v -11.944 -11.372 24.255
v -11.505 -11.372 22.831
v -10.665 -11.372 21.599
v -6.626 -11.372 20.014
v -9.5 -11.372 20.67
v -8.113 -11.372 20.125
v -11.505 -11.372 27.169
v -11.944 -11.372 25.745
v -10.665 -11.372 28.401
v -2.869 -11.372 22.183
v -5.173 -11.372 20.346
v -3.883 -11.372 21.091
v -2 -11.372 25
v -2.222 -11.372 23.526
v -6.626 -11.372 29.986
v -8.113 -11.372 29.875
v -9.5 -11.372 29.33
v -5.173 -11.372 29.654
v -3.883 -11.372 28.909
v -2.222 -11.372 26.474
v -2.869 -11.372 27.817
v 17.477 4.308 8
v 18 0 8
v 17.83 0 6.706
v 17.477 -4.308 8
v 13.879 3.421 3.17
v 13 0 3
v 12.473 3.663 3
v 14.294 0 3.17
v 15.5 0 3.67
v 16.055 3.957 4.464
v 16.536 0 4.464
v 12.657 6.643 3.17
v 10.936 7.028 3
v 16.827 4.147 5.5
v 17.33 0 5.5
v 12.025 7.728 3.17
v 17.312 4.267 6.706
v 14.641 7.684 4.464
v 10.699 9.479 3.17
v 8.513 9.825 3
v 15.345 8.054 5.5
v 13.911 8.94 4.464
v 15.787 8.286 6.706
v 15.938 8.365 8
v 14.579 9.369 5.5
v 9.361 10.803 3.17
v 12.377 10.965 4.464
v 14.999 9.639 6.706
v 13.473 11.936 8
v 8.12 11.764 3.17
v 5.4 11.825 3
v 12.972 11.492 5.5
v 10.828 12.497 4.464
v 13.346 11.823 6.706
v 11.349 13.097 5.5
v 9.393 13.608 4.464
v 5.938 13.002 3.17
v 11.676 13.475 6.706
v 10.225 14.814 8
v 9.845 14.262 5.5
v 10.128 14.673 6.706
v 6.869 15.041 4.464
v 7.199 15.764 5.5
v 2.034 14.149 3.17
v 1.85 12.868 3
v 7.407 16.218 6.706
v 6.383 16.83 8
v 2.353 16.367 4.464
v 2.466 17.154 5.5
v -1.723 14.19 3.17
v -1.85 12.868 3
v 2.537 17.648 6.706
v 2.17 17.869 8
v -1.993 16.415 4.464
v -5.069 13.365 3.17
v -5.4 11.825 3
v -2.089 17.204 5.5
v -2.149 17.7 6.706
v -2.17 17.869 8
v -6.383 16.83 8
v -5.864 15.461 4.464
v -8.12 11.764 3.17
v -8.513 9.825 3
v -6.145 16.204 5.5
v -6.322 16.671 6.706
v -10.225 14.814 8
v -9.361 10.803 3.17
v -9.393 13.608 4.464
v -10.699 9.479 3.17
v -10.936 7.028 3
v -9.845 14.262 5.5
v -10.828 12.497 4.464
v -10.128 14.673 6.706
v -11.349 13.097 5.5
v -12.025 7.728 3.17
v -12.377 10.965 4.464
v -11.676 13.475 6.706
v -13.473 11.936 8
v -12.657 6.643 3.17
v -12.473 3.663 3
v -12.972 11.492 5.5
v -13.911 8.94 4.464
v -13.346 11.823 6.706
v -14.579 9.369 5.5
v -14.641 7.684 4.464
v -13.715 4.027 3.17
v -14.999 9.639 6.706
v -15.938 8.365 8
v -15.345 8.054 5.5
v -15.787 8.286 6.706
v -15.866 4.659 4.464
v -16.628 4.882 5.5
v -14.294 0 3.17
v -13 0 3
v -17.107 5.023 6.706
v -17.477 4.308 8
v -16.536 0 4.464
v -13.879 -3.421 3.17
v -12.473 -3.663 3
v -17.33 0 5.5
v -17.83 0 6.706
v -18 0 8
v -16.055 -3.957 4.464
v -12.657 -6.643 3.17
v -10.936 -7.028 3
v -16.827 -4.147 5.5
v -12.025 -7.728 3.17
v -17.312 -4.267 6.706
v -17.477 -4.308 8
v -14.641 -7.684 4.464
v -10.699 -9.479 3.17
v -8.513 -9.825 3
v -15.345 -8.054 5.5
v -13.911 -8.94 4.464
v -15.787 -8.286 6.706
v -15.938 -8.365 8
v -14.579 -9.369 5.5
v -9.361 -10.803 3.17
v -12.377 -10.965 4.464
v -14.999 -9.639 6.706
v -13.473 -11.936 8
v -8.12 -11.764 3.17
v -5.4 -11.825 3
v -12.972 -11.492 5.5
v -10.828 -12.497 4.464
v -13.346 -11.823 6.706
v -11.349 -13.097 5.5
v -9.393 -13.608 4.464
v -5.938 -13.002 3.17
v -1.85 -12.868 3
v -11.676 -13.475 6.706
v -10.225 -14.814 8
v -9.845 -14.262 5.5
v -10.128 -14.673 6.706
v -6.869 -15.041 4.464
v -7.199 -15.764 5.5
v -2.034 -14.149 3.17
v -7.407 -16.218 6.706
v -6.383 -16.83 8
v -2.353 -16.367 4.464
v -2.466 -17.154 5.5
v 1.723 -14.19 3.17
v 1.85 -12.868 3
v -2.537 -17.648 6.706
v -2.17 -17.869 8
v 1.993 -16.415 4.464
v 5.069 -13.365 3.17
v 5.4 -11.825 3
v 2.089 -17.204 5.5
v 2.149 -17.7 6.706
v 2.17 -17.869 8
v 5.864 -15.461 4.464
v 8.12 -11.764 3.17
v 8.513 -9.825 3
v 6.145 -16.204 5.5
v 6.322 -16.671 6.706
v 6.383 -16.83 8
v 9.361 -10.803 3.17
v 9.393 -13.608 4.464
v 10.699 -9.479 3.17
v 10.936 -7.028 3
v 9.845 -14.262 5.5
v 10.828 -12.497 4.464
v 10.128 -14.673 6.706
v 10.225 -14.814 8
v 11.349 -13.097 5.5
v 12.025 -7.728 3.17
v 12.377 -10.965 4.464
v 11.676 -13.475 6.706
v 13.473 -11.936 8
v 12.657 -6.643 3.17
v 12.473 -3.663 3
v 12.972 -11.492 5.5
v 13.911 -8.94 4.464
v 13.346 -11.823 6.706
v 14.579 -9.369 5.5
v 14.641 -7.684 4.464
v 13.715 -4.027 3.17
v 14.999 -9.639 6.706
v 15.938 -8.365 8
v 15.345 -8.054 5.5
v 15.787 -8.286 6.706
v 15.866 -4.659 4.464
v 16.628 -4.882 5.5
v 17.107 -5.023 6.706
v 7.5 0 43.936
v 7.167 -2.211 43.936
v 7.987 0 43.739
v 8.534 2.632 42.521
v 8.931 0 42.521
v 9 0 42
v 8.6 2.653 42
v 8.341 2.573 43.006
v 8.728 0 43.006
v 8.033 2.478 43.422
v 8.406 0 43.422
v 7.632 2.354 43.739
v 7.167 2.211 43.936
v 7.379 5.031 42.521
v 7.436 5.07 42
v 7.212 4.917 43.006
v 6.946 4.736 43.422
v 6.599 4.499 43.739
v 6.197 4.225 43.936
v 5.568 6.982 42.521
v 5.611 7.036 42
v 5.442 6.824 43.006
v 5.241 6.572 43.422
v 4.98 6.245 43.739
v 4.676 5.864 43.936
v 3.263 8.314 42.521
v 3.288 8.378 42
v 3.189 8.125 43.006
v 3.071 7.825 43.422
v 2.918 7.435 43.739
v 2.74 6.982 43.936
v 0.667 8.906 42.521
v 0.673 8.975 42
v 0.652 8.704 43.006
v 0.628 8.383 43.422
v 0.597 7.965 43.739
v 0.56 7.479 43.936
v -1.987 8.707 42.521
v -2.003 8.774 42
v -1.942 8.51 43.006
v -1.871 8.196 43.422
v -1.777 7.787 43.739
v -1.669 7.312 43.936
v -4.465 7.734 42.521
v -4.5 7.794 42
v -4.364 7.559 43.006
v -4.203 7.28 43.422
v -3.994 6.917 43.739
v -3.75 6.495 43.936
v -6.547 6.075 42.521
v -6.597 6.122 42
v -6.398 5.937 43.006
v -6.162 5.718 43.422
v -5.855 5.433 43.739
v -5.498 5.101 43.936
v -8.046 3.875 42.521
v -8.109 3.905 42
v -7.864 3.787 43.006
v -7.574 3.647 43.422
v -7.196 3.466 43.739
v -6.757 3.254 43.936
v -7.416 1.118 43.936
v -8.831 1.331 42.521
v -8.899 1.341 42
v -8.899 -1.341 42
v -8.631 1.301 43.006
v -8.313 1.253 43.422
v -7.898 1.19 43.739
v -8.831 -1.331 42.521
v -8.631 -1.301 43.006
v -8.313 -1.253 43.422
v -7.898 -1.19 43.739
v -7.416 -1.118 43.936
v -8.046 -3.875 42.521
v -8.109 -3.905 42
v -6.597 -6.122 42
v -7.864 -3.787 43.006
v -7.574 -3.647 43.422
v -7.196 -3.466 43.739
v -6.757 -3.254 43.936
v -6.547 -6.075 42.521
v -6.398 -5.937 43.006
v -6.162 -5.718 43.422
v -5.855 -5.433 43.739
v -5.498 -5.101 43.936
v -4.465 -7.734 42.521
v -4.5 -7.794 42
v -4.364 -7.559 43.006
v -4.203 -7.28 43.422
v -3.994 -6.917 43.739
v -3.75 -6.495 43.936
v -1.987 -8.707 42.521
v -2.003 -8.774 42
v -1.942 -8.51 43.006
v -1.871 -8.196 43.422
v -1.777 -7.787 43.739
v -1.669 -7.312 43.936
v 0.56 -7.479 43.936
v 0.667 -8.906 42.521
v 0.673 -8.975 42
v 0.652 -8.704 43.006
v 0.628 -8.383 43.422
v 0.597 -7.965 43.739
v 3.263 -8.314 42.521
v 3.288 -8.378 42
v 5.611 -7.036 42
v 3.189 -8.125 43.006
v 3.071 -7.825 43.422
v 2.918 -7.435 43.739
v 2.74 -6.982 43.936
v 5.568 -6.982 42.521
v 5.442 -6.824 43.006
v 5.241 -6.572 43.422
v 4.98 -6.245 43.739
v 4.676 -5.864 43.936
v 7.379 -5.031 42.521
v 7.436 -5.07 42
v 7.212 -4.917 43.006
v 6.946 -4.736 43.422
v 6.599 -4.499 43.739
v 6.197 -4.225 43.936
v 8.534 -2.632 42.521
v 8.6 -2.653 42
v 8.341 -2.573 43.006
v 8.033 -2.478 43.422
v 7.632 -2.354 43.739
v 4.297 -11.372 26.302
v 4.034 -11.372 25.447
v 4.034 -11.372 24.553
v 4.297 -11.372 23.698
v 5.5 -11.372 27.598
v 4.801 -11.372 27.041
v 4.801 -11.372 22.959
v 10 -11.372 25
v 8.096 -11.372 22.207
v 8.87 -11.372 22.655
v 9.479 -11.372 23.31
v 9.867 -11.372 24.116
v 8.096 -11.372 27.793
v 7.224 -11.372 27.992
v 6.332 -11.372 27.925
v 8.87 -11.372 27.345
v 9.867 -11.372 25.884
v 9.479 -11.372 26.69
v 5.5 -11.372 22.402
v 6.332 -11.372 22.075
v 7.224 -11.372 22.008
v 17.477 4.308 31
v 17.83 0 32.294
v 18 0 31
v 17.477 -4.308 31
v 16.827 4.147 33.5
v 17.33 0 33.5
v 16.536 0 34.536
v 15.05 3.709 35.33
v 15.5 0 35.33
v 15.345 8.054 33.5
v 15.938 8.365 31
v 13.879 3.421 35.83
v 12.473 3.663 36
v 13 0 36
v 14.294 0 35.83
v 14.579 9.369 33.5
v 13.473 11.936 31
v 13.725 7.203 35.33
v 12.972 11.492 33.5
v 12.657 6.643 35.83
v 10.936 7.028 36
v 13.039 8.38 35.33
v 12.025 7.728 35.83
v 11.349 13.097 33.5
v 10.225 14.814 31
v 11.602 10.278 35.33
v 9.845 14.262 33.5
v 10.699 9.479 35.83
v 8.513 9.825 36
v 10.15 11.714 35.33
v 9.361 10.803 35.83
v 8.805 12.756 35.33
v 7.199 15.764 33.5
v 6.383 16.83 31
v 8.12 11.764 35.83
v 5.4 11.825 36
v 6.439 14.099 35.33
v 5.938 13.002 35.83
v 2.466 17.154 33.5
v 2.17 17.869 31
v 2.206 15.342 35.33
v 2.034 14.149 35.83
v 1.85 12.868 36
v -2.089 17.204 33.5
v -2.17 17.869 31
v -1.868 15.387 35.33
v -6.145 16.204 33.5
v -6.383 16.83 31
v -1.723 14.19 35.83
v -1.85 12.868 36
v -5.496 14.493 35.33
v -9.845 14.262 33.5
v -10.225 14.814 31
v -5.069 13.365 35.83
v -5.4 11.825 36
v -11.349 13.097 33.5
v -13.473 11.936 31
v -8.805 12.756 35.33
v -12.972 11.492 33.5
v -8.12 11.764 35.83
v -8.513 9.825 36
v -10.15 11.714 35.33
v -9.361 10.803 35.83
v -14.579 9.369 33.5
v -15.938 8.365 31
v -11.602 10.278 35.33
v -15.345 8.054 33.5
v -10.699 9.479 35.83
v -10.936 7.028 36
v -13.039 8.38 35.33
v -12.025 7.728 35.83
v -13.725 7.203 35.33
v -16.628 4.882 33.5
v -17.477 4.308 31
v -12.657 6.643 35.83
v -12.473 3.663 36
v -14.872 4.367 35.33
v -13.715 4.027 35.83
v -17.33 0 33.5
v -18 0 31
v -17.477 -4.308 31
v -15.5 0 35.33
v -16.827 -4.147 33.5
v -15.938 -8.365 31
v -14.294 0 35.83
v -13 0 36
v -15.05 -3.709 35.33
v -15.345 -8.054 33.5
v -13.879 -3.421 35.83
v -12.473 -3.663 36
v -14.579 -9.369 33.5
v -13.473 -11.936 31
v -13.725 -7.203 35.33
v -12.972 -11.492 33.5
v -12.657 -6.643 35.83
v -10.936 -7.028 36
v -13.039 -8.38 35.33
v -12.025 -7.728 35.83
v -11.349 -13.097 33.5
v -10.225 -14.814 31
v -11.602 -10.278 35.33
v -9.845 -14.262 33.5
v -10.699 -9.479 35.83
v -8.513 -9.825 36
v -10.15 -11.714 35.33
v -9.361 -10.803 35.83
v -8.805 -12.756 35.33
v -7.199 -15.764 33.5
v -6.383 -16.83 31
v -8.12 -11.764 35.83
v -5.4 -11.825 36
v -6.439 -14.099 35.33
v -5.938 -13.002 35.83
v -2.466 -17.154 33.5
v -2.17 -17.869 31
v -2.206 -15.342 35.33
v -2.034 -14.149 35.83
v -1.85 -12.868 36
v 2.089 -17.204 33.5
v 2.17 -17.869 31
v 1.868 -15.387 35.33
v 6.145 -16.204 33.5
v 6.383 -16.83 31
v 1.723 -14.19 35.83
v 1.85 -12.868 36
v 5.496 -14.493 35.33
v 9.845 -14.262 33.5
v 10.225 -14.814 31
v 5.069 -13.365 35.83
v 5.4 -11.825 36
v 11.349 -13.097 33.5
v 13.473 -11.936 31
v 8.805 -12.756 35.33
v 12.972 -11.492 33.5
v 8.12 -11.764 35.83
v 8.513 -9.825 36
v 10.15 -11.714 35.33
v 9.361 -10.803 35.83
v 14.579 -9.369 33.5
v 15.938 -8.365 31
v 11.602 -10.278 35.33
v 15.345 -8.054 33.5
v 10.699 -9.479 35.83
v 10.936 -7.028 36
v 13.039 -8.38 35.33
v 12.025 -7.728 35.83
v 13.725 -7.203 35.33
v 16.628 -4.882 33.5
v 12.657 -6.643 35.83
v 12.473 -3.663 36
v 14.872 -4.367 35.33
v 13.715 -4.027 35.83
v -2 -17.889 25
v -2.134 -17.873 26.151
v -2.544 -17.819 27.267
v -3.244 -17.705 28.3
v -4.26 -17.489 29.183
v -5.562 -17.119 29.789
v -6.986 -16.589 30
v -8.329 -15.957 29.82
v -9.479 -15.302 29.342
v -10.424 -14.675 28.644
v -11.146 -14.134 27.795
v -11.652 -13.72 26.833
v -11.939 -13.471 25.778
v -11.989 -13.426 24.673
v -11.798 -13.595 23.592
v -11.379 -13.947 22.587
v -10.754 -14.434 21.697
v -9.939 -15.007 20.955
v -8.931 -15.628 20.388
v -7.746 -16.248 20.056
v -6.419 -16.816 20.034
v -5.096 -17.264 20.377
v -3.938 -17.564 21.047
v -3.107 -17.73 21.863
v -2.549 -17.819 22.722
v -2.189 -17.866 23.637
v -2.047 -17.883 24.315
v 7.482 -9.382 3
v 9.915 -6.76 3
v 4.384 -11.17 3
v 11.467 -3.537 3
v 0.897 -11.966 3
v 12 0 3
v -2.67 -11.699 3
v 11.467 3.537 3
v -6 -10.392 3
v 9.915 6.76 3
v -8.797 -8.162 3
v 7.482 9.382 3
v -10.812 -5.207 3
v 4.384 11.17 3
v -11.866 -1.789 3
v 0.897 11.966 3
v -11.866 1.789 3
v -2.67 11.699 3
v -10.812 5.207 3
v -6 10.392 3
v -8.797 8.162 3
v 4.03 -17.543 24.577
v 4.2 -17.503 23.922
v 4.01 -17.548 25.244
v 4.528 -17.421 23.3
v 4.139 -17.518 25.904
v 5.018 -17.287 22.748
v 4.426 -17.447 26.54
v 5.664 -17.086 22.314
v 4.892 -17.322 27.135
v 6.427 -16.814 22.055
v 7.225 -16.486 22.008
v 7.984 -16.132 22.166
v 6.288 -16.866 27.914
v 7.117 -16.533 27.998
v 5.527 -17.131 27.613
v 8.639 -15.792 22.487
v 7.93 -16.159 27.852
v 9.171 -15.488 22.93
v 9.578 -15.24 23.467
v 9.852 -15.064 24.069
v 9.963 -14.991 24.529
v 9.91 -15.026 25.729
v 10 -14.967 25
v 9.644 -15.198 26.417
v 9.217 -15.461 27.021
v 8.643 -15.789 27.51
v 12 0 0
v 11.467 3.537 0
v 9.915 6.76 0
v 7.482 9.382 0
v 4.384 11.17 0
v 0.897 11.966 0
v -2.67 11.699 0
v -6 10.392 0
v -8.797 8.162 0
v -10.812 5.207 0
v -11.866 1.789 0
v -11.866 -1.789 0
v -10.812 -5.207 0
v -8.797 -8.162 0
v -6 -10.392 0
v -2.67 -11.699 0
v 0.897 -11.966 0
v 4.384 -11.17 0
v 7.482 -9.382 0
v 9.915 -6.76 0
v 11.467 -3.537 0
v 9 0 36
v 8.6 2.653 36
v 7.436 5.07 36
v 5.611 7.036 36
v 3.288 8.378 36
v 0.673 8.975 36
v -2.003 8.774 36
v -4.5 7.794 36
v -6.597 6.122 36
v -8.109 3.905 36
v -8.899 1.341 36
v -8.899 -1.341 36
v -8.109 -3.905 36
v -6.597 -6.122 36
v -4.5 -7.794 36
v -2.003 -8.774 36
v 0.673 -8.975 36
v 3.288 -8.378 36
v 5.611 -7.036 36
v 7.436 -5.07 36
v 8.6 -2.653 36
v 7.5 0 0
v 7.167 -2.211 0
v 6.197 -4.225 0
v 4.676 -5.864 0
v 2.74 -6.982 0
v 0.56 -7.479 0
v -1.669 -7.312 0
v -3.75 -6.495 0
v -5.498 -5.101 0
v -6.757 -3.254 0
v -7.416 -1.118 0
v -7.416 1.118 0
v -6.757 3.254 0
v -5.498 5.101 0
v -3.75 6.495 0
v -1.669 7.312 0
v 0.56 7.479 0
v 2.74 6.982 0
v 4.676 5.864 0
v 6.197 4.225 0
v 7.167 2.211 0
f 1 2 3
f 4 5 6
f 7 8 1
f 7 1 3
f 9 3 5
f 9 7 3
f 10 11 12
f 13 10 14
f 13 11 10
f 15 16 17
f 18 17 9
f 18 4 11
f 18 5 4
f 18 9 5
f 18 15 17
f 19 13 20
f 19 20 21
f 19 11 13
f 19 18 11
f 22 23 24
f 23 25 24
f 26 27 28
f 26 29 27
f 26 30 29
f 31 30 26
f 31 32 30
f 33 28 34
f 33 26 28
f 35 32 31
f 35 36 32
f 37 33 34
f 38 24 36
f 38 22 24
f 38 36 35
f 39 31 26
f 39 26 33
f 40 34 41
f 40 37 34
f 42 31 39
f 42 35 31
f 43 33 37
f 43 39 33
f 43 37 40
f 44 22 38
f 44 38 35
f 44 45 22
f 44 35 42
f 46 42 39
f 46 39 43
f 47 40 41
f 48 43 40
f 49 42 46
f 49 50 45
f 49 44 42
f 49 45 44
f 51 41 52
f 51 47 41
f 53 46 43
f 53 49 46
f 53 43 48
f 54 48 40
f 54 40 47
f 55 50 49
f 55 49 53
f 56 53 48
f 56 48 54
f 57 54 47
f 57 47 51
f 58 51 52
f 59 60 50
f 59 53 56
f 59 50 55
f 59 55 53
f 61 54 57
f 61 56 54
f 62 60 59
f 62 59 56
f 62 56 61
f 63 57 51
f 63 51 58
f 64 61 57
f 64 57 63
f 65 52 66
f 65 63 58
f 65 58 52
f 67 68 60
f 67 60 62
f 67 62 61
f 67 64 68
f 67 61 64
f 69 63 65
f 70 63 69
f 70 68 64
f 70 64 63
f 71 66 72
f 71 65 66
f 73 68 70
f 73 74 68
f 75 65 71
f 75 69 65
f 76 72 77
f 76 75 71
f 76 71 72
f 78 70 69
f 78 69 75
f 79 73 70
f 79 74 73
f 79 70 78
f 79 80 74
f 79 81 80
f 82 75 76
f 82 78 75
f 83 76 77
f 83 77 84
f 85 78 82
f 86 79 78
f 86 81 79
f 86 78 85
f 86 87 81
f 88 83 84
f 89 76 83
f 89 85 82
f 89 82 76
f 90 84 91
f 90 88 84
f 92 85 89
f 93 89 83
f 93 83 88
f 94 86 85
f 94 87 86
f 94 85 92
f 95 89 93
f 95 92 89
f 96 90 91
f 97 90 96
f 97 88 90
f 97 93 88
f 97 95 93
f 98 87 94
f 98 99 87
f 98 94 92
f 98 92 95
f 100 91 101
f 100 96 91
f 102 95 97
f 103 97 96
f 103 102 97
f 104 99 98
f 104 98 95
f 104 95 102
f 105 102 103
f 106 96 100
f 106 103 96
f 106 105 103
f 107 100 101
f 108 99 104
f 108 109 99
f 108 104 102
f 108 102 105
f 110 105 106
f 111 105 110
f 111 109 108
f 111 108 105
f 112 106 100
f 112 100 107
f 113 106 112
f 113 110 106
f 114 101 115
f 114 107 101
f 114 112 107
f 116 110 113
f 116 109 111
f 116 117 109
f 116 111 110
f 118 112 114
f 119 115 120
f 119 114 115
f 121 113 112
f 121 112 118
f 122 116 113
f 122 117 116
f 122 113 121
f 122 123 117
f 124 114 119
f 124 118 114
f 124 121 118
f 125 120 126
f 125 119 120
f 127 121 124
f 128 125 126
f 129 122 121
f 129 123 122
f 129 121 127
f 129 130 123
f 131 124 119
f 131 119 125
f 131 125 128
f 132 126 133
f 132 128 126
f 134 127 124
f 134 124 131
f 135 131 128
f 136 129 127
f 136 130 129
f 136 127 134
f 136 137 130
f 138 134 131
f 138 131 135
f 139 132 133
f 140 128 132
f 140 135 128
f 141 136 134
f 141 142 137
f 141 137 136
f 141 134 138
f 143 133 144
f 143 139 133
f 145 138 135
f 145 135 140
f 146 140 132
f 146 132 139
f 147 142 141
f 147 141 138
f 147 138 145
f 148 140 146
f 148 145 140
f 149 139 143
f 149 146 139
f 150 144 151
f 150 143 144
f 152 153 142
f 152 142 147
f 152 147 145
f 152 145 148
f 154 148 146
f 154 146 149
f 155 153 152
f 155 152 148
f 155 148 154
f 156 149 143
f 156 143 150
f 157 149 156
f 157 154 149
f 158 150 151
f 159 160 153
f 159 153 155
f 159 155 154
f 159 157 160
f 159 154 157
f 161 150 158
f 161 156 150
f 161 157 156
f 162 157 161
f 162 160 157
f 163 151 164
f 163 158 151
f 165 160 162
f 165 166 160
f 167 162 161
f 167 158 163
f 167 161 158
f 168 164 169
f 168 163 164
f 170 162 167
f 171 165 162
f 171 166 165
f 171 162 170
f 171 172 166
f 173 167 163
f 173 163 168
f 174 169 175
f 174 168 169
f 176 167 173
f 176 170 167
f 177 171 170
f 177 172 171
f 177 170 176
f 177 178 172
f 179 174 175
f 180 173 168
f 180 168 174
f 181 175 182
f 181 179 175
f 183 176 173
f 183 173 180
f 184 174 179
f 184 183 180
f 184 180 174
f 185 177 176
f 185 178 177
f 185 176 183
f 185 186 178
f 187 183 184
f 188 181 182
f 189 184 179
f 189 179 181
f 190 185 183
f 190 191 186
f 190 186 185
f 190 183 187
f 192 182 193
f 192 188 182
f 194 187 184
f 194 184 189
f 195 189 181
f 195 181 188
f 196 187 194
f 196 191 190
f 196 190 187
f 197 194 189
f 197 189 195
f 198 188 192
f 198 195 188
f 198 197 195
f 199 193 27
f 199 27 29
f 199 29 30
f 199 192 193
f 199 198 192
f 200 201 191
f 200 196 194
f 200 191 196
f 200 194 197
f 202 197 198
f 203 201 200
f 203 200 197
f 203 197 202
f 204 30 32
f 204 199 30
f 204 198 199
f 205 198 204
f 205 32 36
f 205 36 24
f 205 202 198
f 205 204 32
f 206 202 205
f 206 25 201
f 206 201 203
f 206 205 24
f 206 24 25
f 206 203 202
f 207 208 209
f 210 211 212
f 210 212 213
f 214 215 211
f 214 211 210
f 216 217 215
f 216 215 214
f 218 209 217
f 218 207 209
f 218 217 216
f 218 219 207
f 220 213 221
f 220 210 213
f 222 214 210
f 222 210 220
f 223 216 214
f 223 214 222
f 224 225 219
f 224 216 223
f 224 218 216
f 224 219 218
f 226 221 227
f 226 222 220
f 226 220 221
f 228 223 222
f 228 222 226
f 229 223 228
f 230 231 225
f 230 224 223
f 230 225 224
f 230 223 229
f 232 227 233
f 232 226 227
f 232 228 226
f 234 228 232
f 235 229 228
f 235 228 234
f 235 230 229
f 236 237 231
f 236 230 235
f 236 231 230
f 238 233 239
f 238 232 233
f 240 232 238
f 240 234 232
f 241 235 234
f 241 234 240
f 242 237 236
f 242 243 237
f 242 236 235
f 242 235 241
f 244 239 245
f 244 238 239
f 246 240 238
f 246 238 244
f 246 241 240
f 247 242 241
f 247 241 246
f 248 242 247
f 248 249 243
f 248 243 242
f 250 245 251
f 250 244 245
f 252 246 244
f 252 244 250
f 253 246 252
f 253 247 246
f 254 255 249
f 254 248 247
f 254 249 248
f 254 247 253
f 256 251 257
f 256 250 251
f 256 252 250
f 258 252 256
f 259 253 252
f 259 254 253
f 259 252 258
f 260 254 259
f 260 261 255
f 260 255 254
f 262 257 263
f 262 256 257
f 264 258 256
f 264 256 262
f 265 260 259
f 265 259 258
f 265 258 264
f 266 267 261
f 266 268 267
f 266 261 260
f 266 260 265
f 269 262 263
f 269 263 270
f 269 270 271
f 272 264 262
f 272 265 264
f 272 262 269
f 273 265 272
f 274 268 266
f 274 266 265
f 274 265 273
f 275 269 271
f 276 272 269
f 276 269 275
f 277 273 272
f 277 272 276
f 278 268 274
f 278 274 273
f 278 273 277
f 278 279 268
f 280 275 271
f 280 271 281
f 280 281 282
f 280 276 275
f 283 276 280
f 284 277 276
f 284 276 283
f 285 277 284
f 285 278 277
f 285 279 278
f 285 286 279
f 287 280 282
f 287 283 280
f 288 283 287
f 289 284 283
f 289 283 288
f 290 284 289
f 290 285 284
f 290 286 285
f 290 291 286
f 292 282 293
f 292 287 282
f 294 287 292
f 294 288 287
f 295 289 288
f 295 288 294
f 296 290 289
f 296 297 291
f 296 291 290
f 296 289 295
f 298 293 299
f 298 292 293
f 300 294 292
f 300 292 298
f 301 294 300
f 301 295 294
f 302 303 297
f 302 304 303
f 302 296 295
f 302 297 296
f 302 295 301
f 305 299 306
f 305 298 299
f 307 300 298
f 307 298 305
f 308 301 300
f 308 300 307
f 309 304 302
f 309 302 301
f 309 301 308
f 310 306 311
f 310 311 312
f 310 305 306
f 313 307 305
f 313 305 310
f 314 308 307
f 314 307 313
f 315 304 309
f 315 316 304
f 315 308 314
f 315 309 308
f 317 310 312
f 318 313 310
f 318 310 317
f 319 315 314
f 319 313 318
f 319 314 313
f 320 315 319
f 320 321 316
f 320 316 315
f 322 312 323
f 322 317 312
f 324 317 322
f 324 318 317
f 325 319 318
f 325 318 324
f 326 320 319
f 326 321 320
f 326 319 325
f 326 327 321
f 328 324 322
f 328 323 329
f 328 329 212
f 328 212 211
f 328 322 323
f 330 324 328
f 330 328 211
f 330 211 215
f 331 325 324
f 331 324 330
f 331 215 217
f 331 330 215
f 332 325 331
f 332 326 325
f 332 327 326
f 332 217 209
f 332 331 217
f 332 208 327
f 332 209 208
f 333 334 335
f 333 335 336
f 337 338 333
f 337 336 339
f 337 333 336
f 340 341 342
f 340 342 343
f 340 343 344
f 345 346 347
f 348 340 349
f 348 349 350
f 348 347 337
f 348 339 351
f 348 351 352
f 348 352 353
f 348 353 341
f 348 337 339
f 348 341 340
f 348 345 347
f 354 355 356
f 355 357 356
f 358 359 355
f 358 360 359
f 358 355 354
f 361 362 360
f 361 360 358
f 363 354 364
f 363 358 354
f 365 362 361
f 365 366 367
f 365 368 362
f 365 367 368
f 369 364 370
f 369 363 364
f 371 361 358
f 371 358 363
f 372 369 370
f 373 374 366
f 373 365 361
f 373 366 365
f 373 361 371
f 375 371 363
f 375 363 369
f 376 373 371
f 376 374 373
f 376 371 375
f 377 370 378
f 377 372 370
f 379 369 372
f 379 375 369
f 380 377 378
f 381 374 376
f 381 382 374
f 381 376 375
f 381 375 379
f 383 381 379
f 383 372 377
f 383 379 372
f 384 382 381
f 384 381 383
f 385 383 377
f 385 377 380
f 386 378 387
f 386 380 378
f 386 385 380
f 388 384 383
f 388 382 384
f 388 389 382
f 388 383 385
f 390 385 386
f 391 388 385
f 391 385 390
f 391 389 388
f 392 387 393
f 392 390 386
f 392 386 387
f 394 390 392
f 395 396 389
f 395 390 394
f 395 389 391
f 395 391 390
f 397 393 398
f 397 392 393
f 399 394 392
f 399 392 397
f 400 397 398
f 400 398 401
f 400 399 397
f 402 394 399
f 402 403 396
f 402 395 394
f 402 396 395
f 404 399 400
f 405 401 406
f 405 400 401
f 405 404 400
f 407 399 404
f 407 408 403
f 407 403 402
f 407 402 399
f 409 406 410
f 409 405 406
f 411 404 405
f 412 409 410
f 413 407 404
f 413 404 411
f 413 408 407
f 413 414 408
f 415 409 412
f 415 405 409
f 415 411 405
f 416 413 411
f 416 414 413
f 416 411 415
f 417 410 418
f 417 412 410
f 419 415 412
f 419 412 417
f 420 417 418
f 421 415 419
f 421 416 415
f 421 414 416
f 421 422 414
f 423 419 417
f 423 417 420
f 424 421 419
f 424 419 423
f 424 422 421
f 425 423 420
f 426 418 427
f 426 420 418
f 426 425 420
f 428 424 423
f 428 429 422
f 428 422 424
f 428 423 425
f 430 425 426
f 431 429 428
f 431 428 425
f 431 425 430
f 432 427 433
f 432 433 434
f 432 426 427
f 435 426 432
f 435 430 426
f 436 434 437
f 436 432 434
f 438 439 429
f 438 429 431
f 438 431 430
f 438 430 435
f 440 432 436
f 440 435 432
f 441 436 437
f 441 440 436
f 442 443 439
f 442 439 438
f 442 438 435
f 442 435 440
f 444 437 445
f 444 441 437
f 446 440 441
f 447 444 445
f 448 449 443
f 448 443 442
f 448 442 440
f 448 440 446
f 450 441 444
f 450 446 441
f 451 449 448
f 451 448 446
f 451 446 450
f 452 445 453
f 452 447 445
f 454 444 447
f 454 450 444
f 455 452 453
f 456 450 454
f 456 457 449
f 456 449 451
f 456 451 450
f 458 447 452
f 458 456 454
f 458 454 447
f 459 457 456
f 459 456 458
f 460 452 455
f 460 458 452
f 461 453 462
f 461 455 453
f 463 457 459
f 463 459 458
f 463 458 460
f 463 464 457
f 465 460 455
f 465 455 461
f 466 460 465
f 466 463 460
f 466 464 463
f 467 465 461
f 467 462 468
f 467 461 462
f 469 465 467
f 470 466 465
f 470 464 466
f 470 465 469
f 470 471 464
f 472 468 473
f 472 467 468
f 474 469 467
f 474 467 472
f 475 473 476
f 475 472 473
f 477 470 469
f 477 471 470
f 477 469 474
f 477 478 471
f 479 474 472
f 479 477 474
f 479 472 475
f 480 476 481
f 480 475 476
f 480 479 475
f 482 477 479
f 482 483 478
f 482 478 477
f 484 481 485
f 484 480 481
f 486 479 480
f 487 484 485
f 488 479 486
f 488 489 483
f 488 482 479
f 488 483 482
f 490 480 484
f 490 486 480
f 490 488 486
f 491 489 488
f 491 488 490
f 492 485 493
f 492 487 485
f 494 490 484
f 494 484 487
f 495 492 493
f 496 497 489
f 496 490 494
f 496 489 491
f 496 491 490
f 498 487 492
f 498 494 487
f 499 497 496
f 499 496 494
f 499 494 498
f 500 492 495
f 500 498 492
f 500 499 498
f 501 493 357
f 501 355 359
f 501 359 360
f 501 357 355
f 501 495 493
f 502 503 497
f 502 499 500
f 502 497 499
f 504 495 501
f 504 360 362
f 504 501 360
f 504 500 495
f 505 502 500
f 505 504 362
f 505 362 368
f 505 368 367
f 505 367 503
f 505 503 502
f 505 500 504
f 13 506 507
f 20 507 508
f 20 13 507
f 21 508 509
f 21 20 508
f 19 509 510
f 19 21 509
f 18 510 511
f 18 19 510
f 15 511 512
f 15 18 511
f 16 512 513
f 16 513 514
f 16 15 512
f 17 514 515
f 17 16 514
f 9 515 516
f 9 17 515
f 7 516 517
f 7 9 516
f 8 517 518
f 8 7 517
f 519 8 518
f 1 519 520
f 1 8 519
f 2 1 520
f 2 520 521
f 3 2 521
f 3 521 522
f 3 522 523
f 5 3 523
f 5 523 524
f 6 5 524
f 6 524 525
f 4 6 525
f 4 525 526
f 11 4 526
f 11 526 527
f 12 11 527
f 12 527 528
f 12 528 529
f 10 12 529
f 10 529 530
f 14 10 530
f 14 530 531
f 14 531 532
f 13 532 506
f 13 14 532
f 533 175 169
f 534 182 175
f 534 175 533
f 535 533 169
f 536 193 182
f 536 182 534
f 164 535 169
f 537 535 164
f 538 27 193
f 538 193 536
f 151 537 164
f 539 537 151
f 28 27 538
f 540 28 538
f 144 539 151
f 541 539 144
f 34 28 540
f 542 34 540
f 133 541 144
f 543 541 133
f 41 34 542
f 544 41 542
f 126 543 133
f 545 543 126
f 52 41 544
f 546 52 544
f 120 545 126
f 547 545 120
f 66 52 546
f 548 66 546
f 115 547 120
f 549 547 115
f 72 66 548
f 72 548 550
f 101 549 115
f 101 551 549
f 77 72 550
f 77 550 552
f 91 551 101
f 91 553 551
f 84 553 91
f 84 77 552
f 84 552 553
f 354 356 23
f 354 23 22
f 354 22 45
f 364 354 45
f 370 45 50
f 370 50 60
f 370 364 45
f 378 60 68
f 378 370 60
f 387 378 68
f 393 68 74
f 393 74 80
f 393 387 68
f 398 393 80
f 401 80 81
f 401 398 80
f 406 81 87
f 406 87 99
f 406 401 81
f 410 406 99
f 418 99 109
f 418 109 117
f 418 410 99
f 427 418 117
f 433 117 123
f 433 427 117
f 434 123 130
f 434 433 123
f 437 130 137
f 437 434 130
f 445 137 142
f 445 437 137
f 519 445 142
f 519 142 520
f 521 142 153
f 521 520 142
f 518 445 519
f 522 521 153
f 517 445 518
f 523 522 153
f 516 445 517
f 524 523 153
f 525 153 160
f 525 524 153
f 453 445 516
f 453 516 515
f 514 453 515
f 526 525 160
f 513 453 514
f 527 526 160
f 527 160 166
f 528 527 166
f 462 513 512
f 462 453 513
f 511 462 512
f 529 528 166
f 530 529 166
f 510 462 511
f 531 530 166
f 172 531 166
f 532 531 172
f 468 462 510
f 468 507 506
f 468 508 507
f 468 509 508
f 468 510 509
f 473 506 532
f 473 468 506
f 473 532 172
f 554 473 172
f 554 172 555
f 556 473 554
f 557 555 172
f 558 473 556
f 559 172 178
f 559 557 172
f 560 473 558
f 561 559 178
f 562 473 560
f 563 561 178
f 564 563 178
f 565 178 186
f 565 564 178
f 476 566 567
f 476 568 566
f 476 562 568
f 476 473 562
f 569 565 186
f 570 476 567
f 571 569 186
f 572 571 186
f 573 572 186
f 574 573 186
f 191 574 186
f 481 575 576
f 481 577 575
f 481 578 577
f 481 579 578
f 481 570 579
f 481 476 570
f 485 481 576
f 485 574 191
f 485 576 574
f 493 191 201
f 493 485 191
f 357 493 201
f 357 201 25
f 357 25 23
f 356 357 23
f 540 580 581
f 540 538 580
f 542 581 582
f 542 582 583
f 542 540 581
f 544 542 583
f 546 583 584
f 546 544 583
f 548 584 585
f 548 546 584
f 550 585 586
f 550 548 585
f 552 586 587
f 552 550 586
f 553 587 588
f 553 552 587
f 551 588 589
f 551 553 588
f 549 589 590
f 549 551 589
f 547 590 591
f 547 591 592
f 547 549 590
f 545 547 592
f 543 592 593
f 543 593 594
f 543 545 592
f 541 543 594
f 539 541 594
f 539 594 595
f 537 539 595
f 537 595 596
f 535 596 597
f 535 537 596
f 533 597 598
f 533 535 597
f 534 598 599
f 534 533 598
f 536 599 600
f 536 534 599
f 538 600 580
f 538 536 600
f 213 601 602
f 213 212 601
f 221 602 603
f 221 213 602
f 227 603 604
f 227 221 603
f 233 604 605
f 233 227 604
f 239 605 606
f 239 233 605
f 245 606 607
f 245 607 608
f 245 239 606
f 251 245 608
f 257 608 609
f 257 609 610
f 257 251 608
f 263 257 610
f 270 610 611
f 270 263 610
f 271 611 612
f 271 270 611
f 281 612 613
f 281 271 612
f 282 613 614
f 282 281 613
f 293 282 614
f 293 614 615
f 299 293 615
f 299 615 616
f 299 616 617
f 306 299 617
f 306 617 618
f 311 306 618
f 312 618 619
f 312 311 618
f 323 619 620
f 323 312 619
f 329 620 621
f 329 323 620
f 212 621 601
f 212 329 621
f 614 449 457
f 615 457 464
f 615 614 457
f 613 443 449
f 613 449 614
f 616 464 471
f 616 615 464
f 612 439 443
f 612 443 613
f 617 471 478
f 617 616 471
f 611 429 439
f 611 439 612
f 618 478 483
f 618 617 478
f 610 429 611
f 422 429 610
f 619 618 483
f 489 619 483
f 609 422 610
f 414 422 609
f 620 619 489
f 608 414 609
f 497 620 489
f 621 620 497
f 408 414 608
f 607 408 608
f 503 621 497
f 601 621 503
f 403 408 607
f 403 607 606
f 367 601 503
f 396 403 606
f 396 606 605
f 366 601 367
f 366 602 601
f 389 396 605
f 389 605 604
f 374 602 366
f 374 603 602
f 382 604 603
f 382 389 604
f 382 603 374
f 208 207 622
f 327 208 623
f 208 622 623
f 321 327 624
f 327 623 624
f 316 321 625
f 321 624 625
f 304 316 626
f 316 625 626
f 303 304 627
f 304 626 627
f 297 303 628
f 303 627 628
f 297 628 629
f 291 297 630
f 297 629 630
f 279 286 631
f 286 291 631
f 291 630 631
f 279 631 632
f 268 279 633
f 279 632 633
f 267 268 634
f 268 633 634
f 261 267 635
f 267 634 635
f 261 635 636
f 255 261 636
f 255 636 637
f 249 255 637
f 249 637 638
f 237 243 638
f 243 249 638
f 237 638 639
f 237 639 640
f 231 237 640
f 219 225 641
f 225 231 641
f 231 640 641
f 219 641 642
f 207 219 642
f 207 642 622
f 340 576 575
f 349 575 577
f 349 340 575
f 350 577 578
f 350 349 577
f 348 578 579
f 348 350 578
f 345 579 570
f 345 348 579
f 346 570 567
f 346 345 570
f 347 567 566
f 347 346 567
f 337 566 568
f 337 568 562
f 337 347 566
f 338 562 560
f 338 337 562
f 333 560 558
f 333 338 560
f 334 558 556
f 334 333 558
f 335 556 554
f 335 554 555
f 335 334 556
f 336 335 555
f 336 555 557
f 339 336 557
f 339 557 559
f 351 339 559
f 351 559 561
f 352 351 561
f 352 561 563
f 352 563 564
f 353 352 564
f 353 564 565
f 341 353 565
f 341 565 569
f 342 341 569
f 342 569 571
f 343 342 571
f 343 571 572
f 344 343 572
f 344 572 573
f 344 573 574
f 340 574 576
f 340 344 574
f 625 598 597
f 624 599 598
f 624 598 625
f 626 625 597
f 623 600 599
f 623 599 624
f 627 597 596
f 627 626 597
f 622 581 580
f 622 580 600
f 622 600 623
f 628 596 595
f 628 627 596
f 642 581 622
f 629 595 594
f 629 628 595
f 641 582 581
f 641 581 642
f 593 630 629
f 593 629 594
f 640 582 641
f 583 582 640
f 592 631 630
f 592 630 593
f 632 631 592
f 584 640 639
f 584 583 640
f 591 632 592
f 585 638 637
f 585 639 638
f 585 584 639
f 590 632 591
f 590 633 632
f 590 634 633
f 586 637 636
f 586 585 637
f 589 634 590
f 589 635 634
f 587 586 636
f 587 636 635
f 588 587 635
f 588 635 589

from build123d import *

# Parameters (mm, degrees)
F2_R     = 7.5
F3_DEPTH = 44
F5_START = 11.37151
F4_R     = 3
F4_R_2   = 5
F5_DEPTH = 8.99461


with BuildPart() as f1:
    # F0 (on Front) → F1 (revolve)
    with BuildSketch(Plane.XZ):
        with BuildLine():
            Line((7, 44), (0, 44))
            Line((0, 44), (0, 0))
            Line((0, 0), (12, 0))
            Line((12, 0), (12, 3))
            Line((12, 3), (13, 3))
            ThreePointArc((13, 3), (16.5355339059, 4.4644660941), (18, 8))
            Line((18, 8), (18, 31))
            ThreePointArc((18, 31), (16.5355339059, 34.5355339059), (13, 36))
            Line((13, 36), (9, 36))
            Line((9, 36), (9, 42))
            ThreePointArc((9, 42), (8.4142135624, 43.4142135624), (7, 44))
        make_face()
    revolve(axis=Axis((0, 0, 22), (0, 0, 1)))

    # F2 (on face) → F3 (cut, through all)
    with BuildSketch(Plane(origin=(0, 0, 0), x_dir=(1, 0, 0), z_dir=(0, 0, -1))):
        Circle(F2_R)
    extrude(amount=-F3_DEPTH, mode=Mode.SUBTRACT)

    # F4 (on Front) → F5 (cut)
    with BuildSketch(Plane.XZ.offset(F5_START)):
        with Locations((7, 25)):
            Circle(F4_R)
        with Locations((-7, 25)):
            Circle(F4_R_2)
    extrude(amount=F5_DEPTH, mode=Mode.SUBTRACT)


solid = f1.part
